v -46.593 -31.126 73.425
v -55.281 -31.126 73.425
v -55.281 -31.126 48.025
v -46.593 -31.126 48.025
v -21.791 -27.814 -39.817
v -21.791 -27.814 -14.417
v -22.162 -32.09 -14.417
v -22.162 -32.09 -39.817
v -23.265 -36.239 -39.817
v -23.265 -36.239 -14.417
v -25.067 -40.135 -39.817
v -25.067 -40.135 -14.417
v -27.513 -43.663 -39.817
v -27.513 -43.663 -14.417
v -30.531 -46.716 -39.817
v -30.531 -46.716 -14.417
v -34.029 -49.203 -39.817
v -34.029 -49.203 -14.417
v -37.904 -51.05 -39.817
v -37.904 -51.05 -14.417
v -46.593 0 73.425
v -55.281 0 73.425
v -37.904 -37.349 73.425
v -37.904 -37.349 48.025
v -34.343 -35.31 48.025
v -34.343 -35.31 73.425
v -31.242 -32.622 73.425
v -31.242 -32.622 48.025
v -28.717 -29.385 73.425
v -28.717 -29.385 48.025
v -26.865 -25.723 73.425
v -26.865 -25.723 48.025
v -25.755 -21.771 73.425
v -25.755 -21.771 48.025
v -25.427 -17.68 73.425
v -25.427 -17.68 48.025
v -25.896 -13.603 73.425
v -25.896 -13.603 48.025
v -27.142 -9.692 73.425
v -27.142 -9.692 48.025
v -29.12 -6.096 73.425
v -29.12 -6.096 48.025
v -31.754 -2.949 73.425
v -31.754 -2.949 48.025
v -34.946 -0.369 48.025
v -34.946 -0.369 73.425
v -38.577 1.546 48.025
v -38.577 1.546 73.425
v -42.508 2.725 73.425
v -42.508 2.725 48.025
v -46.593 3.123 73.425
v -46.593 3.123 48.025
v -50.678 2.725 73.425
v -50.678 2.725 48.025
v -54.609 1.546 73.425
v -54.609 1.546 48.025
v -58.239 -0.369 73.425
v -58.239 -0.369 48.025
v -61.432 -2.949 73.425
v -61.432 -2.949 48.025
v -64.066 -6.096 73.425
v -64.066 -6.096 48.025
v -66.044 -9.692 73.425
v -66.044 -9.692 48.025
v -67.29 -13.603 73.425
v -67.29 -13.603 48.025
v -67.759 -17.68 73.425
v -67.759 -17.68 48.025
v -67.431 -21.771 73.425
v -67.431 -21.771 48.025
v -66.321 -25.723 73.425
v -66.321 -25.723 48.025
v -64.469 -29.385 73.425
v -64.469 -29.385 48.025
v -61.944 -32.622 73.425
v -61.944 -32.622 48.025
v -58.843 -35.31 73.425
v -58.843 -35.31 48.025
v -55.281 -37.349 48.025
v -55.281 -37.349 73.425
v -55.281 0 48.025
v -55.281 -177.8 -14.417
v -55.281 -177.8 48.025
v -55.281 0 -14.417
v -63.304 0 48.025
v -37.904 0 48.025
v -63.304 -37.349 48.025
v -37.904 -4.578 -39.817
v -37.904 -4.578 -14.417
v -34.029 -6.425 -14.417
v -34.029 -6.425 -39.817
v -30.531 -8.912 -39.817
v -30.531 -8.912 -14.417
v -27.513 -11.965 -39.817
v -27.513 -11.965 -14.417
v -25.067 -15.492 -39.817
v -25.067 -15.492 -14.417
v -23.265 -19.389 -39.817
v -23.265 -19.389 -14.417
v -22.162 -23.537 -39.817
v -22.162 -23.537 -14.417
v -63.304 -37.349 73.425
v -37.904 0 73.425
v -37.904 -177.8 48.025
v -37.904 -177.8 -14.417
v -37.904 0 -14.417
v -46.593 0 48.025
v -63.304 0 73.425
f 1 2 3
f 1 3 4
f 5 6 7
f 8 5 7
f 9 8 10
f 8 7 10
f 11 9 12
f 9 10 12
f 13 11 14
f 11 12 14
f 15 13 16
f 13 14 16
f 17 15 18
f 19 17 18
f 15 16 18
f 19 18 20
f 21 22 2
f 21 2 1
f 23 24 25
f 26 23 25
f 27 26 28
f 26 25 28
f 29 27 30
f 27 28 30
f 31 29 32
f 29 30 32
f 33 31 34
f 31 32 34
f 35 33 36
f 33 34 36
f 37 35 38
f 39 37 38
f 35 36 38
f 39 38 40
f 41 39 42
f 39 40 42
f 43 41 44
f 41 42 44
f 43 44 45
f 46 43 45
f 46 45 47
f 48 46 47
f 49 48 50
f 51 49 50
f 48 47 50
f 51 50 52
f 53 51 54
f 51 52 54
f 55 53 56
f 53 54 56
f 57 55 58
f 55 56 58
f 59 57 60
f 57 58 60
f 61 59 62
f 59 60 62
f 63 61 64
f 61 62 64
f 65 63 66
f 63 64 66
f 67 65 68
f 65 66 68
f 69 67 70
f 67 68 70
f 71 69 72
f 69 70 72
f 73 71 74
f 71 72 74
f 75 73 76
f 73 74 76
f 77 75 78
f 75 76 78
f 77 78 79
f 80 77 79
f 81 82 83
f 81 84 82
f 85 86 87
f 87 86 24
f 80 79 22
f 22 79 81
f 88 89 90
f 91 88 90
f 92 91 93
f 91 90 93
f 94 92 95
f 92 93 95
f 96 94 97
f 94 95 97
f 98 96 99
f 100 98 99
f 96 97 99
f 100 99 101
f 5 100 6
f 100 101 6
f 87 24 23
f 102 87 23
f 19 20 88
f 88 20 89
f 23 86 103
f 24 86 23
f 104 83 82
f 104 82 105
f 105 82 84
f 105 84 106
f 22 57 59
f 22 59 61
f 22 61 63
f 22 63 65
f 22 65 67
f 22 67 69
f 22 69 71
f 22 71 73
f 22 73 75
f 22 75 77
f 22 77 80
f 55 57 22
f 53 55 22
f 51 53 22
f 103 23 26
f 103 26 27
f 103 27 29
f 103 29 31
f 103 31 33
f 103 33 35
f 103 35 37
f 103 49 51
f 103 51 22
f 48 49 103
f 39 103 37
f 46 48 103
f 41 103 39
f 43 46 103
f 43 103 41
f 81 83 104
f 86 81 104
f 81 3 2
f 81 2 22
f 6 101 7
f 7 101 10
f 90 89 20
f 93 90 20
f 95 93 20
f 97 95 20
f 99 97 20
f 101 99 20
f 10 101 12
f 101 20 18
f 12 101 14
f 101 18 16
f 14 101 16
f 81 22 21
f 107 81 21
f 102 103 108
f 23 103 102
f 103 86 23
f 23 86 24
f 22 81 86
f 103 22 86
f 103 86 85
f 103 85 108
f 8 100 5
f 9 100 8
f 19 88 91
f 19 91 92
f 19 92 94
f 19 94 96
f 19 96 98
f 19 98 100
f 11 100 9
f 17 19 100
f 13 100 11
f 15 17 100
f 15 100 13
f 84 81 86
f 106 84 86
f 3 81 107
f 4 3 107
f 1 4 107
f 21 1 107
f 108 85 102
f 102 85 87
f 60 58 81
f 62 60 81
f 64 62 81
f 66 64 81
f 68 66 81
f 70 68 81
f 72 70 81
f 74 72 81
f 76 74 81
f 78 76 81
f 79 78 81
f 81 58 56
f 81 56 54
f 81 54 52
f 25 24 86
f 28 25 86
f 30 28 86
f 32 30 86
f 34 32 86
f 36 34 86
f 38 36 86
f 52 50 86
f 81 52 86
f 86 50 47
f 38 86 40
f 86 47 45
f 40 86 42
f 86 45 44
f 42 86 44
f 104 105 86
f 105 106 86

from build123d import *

# Parameters (mm, degrees)
F0_W     = 17.3768736422
F0_H     = 62.4421741813
F1_DEPTH = 127
F2_DEPTH = 50.8
F4_DEPTH = 25.4
F6_DEPTH = 25.4
F7_W     = 8.6884368211
F7_H     = 31.1260204762
F8_DEPTH = 25.4
F9_DEPTH = 25.4


with BuildPart() as f1:
    # F0 (on Front) → F1 (new body)
    with BuildSketch(Plane.XZ):
        with Locations((-46.5929340571, 16.8040106073)):
            Rectangle(F0_W, F0_H)
    extrude(amount=F1_DEPTH)

    # F2 (add): a face of the model
    f2_faces = [f1.faces().sort_by_distance(p)[0] for p in [
        (-46.5929340571, -127, 16.8040106073),
    ]]
    extrude(f2_faces, amount=F2_DEPTH)


with BuildPart() as f4:
    # F3 (on face) → F4 (new body)
    with BuildSketch(Plane.XY.offset(48.025097698)):
        with BuildLine():
            ThreePointArc((-37.904497236, -37.3494494503), (-28.8159794009, -29.5392090488), (-25.4241662195, -18.0458799005))
            ThreePointArc((-25.4241662195, -18.0458799005), (-58.0862632055, -0.2689252442), (-55.2813708782, -37.3494494503))
            Line((-55.2813708782, -37.3494494503), (-55.2813708782, 0))
            Line((-55.2813708782, 0), (-37.904497236, 0))
            Line((-37.904497236, 0), (-37.904497236, -37.3494494503))
        make_face()
    extrude(amount=F4_DEPTH)


with BuildPart() as f6:
    # F5 (on face) → F6 (new body)
    with BuildSketch(Plane(origin=(0, 0, -14.4170764834), x_dir=(1, 0, 0), z_dir=(0, 0, -1))):
        with BuildLine():
            ThreePointArc((-37.904497236, 4.5781515434), (-26.2133427827, 13.6756799094), (-21.7906919048, 27.8138648719))
            ThreePointArc((-21.7906919048, 27.8138648719), (-26.2133427827, 41.9520498344), (-37.904497236, 51.0495782003))
            Line((-37.904497236, 51.0495782003), (-37.904497236, 4.5781515434))
        make_face()
    extrude(amount=F6_DEPTH)


with BuildPart() as f8:
    # F7 (on face) → F8 (new body)
    with BuildSketch(Plane.XY.offset(48.025097698)):
        with Locations((-50.9371524677, -15.5630102381)):
            Rectangle(F7_W, F7_H)
    extrude(amount=F8_DEPTH)


with BuildPart() as f9:
    # F9 (new): a face of the model
    f9_faces = [f4.part.faces().sort_by_distance(p)[0] for p in [
        (-37.904497236, -18.6747247252, 60.725097698),
    ]]
    extrude(f9_faces, amount=F9_DEPTH)


solid = Compound([f1.part, f4.part, f6.part, f8.part, f9.part])
